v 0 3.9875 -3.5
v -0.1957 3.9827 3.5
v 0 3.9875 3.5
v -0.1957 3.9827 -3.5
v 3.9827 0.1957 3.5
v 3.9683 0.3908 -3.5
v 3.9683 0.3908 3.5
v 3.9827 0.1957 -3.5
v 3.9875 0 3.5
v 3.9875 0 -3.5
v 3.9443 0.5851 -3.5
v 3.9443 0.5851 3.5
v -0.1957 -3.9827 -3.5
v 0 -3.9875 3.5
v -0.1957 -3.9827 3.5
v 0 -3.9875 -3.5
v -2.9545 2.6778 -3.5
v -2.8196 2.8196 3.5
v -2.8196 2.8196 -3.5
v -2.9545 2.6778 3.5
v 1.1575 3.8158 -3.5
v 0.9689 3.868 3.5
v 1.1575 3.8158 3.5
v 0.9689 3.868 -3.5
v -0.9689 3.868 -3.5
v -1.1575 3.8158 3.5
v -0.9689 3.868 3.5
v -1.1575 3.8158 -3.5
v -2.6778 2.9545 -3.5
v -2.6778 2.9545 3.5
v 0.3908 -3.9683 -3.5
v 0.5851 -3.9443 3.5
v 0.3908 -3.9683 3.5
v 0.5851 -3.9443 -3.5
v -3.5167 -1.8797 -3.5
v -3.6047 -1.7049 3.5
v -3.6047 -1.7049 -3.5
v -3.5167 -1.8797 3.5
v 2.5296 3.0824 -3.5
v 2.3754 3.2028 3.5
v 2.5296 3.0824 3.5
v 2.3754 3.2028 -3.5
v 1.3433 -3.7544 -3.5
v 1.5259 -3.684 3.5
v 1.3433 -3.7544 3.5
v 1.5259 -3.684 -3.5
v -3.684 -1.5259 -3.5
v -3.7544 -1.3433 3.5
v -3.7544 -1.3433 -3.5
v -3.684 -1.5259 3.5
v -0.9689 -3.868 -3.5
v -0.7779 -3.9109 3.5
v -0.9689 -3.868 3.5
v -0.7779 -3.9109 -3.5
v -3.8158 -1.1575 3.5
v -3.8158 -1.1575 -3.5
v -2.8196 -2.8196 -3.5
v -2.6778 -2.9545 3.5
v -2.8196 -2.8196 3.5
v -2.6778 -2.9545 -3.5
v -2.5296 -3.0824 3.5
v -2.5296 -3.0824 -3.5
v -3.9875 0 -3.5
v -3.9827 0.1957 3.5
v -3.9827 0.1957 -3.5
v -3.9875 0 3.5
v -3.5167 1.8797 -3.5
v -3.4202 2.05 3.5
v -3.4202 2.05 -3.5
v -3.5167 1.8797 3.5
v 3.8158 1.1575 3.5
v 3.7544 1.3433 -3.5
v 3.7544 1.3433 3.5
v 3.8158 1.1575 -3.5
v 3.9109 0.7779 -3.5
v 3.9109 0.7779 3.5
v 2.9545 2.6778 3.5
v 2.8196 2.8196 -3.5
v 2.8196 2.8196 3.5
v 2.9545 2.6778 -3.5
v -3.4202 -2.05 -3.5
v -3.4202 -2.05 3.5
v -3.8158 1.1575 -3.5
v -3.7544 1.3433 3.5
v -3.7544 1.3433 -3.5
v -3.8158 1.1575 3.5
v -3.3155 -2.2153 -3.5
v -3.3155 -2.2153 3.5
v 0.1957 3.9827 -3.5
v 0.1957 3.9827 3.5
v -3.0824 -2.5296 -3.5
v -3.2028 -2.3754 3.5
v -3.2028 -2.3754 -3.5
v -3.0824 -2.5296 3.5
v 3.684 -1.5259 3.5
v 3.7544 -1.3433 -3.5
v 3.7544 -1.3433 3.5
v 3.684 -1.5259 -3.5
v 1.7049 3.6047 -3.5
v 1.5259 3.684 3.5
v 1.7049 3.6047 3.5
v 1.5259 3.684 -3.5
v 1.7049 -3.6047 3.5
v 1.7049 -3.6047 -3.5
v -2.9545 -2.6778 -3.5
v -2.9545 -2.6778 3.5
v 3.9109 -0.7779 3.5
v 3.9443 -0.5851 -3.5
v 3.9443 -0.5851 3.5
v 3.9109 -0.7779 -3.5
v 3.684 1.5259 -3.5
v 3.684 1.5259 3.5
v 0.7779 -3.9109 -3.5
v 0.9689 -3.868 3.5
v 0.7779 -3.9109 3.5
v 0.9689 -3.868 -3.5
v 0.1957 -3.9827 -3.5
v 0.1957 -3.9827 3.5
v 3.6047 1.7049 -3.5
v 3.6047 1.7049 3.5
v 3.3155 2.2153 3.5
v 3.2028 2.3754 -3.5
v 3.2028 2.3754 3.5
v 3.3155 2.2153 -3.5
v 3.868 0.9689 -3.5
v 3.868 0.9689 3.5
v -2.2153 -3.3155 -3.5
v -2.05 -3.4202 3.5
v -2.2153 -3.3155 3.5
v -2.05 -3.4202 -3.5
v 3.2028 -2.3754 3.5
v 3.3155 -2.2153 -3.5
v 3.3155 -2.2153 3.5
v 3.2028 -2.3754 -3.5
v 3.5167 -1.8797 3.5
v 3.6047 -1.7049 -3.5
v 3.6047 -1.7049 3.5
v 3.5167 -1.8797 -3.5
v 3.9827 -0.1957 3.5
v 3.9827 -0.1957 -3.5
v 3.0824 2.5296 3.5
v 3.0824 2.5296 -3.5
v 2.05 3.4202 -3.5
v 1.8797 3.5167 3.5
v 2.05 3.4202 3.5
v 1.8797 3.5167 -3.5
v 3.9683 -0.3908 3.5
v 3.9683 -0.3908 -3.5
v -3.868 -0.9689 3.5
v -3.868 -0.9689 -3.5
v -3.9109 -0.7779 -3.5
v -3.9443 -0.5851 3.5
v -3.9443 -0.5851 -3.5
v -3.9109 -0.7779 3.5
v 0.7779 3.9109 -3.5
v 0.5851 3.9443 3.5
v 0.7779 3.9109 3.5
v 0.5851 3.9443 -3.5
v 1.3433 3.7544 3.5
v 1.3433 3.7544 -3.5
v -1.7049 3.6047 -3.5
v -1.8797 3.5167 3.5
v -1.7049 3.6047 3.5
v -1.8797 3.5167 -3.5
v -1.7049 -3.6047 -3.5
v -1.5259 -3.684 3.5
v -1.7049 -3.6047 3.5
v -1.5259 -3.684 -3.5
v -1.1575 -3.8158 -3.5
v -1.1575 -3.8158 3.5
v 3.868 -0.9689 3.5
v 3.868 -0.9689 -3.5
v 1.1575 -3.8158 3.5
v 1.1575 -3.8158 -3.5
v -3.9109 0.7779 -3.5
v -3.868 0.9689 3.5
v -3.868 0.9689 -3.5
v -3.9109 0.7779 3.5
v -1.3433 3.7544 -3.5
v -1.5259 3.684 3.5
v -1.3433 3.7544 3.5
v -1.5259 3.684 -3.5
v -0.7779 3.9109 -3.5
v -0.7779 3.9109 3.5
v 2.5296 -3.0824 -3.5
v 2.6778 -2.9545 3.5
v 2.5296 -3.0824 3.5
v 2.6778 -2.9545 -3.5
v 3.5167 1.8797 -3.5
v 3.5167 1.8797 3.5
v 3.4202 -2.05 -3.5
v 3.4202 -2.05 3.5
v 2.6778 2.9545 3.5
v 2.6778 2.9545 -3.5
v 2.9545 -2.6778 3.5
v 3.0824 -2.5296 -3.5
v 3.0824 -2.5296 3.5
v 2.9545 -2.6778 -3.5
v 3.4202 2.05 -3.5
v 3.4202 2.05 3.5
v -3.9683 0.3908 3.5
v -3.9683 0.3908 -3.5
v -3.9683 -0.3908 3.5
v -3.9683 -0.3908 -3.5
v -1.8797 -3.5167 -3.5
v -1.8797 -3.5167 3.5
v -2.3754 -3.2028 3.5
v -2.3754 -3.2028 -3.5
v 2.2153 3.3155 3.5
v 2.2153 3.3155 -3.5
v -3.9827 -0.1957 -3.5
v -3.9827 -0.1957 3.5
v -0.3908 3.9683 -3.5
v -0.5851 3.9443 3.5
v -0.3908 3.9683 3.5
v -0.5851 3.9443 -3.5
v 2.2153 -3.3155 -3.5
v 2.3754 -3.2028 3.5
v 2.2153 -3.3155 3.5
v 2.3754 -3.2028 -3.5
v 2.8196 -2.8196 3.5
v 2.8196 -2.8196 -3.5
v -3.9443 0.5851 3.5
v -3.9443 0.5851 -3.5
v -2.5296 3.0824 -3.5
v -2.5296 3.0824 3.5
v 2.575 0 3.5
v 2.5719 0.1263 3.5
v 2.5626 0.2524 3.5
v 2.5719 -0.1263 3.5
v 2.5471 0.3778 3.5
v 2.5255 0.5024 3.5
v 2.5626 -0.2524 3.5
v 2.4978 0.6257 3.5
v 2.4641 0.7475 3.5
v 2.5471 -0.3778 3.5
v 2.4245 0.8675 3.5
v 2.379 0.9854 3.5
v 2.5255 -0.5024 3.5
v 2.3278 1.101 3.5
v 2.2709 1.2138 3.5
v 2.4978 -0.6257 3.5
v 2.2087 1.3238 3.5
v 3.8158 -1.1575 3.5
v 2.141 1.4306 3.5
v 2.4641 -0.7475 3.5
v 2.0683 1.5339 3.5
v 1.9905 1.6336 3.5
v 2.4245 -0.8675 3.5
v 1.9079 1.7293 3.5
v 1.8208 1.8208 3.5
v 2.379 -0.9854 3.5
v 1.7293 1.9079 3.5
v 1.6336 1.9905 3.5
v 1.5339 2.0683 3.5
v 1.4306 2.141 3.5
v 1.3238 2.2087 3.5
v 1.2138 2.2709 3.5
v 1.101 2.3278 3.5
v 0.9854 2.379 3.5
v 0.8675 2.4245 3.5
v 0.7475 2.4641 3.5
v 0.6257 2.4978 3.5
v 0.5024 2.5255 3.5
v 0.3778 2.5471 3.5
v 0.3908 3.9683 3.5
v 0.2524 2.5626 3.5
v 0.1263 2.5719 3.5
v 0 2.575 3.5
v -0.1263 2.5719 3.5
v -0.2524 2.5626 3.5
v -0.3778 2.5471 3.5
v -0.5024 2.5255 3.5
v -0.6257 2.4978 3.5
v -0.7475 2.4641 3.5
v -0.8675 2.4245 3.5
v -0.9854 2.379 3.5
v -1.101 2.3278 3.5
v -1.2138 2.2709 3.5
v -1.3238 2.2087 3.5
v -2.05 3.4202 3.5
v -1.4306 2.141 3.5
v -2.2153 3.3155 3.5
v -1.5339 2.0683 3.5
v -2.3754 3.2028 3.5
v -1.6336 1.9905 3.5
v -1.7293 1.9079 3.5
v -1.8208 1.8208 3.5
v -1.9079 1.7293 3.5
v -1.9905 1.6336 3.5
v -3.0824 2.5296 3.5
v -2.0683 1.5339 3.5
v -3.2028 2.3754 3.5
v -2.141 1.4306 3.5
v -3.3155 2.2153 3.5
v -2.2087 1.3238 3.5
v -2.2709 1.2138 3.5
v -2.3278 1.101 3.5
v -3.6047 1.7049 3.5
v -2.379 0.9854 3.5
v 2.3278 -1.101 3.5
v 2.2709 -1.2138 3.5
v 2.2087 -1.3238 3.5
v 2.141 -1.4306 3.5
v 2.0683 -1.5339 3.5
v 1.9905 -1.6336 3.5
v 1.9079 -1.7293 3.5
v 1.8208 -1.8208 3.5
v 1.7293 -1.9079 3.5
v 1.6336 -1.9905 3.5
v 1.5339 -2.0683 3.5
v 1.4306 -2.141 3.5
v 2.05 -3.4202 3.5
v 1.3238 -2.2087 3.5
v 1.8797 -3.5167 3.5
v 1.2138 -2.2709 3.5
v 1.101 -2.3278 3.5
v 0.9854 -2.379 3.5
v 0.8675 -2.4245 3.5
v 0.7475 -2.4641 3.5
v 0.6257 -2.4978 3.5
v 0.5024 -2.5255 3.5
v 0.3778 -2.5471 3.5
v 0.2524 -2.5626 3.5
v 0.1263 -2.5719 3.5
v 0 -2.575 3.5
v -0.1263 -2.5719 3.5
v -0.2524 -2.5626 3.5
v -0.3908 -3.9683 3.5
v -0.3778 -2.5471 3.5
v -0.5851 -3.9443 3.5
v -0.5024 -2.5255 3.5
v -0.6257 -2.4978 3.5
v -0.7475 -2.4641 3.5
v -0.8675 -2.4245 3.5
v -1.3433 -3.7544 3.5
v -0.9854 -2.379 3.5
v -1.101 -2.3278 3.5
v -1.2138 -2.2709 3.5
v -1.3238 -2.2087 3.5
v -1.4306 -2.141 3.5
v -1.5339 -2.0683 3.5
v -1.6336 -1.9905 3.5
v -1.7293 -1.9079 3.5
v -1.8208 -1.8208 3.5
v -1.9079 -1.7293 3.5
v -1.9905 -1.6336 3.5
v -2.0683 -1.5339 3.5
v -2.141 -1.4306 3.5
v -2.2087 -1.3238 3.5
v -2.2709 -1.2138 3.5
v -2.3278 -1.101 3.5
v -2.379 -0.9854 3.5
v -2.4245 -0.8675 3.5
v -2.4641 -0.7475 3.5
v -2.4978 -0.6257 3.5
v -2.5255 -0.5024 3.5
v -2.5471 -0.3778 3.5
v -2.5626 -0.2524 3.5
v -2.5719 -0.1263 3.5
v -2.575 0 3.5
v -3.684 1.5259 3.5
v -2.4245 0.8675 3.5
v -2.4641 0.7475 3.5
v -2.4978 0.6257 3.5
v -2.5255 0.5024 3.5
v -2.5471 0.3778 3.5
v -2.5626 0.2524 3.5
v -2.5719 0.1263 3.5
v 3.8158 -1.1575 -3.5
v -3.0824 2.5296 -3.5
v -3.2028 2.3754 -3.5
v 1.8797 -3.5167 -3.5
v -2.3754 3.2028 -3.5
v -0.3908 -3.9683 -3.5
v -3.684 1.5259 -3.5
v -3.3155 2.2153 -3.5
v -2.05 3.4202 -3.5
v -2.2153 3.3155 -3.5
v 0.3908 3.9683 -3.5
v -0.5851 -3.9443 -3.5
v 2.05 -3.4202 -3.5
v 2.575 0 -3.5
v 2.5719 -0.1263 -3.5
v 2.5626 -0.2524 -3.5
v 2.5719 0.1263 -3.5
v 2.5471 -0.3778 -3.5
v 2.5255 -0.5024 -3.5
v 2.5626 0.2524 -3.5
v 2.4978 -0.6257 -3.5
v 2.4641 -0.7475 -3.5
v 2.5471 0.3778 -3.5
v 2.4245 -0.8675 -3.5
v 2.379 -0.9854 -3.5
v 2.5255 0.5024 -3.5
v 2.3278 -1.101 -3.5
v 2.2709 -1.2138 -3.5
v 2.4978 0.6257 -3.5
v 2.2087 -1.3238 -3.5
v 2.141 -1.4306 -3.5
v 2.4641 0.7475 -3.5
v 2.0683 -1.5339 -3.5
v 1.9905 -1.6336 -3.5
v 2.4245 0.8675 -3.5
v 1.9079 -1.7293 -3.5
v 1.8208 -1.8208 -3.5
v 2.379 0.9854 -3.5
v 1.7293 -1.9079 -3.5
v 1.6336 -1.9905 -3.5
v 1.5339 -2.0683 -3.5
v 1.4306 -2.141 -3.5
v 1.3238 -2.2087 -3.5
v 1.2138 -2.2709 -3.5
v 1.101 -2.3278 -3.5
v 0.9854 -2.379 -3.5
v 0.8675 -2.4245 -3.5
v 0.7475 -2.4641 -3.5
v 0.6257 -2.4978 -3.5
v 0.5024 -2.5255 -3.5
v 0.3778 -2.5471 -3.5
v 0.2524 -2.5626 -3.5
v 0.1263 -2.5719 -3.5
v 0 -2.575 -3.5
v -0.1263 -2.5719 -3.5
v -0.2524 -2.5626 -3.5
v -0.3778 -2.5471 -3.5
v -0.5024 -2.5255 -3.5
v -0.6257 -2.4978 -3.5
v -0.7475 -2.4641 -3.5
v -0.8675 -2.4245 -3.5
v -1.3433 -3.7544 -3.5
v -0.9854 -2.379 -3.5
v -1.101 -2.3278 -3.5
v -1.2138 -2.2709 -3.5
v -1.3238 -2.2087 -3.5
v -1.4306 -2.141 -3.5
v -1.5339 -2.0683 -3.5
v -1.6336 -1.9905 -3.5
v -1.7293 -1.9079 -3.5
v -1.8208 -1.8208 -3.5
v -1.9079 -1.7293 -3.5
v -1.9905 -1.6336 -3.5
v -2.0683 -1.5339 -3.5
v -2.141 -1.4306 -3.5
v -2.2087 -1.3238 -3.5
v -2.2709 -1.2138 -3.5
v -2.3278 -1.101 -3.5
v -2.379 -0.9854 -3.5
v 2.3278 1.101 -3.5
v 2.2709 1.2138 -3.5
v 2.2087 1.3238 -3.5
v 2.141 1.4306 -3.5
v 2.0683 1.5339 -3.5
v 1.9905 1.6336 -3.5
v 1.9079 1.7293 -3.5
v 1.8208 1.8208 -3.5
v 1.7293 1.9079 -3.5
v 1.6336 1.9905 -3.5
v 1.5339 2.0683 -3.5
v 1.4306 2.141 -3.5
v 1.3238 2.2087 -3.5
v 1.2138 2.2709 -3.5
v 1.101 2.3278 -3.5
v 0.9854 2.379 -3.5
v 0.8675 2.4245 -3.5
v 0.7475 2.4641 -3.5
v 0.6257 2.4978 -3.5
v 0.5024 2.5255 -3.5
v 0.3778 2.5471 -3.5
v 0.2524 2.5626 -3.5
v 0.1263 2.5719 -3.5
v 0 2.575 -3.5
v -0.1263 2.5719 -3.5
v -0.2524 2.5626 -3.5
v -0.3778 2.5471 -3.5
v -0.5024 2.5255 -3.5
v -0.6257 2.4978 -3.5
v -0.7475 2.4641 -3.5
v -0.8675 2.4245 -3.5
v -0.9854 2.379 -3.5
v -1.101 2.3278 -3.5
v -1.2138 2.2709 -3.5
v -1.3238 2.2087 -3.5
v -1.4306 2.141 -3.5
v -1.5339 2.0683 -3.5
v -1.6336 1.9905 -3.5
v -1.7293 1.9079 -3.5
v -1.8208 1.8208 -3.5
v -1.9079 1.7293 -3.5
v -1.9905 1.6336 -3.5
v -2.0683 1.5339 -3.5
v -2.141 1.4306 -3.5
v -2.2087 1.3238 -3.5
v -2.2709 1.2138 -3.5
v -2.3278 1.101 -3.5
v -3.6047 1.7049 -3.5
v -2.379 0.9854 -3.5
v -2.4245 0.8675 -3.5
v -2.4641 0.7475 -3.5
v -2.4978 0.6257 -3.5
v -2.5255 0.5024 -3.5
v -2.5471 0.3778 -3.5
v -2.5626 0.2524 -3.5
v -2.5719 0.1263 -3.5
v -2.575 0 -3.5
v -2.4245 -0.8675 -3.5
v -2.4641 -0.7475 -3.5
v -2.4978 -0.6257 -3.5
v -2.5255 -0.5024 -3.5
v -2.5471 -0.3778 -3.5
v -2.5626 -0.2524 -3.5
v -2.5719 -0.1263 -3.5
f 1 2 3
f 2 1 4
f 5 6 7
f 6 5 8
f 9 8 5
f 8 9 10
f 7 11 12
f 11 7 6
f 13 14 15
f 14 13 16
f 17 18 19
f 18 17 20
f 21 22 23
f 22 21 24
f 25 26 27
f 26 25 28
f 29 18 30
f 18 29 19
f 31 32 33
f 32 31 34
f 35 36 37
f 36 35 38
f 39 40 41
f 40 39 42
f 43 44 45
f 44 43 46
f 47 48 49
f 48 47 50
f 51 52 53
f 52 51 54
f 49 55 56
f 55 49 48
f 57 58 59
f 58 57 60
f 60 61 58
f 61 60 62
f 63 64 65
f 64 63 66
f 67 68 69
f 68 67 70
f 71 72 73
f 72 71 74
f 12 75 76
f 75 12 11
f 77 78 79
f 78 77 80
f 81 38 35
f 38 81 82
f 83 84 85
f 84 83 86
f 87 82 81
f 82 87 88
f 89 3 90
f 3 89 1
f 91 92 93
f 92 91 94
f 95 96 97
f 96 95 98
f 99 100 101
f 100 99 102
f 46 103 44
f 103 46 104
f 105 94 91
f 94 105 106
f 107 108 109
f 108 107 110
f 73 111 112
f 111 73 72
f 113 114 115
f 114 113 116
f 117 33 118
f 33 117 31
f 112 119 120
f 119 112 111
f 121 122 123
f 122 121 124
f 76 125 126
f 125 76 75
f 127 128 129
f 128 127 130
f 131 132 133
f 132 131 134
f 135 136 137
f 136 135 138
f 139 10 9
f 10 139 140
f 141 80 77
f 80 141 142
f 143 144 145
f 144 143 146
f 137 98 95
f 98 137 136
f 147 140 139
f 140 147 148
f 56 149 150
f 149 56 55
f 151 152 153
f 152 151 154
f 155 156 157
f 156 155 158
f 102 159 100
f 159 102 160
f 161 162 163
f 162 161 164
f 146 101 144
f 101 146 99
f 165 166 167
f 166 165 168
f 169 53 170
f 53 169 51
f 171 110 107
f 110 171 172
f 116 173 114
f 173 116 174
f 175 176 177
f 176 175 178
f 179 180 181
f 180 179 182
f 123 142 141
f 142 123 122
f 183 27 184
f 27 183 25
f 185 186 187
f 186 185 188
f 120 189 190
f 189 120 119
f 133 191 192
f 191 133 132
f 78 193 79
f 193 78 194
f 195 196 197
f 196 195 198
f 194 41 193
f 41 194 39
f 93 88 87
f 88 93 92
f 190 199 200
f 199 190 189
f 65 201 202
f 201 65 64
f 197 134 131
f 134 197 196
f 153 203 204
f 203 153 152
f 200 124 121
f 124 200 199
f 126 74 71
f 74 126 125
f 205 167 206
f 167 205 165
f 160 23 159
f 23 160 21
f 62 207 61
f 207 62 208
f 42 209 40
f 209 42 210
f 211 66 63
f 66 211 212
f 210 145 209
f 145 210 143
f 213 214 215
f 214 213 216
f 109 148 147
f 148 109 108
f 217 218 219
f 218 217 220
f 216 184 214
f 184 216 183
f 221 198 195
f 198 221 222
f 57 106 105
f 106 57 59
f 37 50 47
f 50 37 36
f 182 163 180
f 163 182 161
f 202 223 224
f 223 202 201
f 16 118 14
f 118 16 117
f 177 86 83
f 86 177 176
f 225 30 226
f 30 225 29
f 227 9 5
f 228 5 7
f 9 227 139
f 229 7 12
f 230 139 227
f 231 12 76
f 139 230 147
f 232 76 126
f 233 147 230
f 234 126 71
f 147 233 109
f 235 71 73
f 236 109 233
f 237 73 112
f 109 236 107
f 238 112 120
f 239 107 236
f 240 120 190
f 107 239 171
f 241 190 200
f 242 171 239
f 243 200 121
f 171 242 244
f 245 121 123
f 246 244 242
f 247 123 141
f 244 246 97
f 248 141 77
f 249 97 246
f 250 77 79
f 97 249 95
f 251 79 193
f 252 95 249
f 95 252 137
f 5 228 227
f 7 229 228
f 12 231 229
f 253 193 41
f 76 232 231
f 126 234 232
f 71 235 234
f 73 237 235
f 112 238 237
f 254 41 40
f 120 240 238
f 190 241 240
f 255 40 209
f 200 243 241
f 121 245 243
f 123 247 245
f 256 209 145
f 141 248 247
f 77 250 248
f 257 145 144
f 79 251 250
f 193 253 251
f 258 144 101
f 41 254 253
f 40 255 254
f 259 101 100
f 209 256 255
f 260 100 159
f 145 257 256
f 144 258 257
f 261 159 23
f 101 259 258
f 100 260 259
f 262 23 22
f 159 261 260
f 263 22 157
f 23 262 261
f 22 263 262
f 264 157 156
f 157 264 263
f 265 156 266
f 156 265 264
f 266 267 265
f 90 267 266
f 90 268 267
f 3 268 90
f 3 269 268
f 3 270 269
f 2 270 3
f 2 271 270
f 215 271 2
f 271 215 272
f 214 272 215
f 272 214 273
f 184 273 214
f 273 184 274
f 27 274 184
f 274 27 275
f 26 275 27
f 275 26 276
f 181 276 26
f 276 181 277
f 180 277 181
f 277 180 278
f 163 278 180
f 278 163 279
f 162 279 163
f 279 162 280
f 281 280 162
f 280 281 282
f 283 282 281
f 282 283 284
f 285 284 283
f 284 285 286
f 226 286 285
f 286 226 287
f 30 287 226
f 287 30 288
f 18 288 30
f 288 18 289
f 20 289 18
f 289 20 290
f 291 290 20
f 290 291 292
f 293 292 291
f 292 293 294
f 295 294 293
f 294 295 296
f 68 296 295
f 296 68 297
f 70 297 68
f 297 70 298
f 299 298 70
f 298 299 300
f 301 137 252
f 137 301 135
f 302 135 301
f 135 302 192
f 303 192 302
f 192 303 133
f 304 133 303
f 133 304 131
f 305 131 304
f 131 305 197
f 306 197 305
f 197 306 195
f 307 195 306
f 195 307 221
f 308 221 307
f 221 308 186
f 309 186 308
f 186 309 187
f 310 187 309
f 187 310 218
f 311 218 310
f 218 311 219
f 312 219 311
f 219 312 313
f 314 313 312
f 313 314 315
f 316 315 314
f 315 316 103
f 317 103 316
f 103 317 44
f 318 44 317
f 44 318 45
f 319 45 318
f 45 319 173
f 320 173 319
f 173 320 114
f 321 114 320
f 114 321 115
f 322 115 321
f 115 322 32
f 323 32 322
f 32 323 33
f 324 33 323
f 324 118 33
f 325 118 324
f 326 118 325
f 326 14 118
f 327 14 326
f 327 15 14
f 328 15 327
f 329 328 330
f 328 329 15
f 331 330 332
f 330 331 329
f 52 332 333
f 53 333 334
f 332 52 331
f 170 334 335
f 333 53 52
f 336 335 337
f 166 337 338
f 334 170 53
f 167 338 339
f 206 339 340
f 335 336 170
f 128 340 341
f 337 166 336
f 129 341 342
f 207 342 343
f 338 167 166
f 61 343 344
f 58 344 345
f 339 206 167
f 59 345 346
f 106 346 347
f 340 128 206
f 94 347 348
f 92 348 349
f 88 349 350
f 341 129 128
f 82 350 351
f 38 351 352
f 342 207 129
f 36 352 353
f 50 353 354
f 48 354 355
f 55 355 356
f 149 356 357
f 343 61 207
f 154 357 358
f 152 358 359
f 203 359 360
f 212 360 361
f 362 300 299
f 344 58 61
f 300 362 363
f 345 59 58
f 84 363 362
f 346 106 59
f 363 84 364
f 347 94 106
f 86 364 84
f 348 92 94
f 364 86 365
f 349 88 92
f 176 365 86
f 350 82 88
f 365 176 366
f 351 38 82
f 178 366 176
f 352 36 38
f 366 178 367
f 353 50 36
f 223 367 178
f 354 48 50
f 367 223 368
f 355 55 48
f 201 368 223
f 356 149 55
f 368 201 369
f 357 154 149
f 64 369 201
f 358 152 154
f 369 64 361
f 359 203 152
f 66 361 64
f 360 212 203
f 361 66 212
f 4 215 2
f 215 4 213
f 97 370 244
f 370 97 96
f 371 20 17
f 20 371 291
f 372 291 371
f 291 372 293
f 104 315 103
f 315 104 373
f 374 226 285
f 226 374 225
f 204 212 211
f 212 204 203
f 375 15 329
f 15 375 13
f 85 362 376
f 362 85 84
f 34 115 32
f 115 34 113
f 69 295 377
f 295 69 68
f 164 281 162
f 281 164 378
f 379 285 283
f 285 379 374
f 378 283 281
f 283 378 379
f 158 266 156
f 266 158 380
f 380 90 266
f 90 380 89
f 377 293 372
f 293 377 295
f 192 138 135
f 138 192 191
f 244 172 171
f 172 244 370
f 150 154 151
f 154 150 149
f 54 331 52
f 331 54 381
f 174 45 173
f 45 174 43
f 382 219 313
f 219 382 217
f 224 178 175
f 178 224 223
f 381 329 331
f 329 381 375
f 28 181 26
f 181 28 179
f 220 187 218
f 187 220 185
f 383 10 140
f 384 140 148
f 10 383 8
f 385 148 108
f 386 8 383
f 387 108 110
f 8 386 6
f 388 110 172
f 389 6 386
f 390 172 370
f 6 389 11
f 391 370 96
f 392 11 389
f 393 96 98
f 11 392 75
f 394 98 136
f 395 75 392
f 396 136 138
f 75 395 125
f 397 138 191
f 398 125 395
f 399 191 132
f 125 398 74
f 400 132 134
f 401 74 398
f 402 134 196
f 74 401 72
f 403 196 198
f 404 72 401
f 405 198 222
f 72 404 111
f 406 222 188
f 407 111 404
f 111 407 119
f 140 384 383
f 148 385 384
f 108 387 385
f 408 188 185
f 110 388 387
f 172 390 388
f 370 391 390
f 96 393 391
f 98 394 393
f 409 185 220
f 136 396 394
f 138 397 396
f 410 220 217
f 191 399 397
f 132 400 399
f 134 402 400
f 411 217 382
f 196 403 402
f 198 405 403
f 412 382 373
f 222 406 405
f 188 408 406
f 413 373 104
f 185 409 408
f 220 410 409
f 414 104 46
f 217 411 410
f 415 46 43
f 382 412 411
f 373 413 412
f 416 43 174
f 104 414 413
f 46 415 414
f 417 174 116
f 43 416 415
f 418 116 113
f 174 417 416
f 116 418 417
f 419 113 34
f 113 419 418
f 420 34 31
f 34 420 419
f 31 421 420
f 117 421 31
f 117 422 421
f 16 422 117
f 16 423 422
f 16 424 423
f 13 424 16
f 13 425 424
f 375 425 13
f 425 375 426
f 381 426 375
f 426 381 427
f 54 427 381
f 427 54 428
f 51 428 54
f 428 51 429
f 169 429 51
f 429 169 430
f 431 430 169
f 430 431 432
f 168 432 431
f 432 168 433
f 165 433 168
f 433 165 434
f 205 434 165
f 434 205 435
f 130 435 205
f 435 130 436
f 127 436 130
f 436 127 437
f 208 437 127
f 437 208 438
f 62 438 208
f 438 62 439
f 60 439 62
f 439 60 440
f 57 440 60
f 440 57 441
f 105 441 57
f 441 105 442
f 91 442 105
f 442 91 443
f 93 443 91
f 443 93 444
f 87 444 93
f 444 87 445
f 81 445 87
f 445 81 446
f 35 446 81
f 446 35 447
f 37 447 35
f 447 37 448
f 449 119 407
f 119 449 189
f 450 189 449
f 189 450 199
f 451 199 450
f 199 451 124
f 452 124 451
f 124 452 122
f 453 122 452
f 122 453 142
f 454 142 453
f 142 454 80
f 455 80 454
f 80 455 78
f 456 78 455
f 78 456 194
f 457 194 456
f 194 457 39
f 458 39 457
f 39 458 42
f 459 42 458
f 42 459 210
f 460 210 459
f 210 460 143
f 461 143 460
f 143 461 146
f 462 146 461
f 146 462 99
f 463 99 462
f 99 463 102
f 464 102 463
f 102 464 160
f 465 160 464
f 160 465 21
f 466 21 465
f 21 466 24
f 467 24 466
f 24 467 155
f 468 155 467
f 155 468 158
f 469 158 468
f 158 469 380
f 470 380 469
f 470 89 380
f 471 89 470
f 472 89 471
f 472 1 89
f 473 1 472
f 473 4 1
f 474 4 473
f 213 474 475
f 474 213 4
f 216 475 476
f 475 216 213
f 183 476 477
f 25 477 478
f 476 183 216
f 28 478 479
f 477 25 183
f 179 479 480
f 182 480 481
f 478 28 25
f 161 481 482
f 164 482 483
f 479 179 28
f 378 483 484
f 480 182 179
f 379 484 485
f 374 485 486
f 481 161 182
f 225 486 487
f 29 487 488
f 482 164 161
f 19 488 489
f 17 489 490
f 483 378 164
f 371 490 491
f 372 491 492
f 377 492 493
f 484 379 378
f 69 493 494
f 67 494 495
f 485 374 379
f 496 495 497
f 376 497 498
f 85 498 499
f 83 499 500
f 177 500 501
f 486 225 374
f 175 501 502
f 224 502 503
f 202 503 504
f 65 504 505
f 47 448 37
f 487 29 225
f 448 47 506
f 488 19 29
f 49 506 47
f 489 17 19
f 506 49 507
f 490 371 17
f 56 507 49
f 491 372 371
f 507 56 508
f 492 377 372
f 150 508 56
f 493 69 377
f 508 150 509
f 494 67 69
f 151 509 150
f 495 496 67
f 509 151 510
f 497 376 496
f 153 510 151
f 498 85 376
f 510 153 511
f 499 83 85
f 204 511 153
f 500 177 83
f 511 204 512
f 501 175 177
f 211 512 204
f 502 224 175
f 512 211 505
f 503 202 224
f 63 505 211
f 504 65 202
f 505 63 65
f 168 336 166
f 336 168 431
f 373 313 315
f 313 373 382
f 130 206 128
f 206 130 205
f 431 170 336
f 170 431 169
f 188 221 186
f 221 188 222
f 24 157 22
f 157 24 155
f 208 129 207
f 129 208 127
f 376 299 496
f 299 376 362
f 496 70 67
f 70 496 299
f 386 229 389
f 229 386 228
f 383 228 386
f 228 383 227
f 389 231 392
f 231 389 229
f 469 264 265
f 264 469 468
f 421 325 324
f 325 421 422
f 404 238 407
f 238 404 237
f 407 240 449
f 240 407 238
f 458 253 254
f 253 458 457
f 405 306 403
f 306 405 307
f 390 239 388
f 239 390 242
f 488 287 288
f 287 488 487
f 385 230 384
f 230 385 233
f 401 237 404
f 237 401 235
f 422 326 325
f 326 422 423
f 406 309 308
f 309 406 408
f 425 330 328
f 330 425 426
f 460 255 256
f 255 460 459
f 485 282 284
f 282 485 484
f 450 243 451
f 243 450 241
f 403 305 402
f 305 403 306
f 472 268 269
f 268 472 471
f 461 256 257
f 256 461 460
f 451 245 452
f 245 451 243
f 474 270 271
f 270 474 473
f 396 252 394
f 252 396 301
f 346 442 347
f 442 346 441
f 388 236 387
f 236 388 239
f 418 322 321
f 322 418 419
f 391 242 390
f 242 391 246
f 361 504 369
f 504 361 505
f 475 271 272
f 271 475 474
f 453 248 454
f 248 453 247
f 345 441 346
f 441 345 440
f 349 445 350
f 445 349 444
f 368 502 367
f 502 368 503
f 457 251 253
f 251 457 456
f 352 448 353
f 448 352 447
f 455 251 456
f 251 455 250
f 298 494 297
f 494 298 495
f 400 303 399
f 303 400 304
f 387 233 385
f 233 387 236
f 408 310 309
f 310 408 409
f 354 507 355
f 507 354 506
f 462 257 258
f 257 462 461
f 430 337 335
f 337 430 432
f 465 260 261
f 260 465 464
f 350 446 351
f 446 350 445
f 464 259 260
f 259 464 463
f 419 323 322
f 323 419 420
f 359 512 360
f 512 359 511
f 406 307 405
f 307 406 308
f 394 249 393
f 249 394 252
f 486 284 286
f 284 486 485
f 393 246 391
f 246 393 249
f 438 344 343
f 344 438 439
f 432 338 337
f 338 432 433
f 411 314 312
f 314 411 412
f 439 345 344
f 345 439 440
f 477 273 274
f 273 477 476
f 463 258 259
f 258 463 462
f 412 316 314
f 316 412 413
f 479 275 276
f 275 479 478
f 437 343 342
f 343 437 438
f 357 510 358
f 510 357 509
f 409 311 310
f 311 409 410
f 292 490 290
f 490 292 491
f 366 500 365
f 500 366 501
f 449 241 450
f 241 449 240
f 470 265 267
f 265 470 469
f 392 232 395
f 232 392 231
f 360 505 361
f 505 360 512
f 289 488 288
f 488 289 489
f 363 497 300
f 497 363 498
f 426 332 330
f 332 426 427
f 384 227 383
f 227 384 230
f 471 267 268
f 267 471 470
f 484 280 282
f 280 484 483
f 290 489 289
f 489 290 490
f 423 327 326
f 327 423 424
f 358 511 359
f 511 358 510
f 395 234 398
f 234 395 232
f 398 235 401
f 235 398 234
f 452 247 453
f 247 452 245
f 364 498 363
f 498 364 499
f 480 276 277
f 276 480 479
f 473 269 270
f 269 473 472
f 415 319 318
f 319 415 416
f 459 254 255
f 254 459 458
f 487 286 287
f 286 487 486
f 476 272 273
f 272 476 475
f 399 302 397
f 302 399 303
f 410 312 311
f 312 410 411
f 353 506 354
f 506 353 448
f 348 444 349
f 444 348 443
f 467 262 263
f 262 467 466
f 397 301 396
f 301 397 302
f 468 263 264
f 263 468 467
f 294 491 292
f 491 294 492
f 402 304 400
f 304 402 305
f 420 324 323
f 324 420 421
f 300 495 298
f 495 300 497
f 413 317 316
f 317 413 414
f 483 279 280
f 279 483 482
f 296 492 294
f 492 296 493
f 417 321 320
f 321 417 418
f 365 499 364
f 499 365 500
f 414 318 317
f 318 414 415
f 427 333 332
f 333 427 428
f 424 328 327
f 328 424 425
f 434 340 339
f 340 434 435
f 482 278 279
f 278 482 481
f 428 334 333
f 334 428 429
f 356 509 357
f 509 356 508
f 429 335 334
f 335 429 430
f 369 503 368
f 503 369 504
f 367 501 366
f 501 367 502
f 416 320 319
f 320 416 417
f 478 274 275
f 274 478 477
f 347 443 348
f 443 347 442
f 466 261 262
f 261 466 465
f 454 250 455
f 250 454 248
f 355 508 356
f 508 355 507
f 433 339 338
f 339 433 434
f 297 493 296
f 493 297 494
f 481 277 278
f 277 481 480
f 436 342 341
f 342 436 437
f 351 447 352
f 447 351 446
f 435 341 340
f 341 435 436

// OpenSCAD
//Bearing adapter

//outer diameter of adapter (inner diameter of bearing)
outer_diameter = 7.975;

//inner diameter of adapter
inner_diameter = 5.15;

//bearing width
bearing_width = 7;


/*[Hidden]*/

difference() {
    cylinder (d=outer_diameter,h=bearing_width,center=true,$fn=128);
    cylinder (d=inner_diameter,h=bearing_width+1,center=true,$fn=128);
}
